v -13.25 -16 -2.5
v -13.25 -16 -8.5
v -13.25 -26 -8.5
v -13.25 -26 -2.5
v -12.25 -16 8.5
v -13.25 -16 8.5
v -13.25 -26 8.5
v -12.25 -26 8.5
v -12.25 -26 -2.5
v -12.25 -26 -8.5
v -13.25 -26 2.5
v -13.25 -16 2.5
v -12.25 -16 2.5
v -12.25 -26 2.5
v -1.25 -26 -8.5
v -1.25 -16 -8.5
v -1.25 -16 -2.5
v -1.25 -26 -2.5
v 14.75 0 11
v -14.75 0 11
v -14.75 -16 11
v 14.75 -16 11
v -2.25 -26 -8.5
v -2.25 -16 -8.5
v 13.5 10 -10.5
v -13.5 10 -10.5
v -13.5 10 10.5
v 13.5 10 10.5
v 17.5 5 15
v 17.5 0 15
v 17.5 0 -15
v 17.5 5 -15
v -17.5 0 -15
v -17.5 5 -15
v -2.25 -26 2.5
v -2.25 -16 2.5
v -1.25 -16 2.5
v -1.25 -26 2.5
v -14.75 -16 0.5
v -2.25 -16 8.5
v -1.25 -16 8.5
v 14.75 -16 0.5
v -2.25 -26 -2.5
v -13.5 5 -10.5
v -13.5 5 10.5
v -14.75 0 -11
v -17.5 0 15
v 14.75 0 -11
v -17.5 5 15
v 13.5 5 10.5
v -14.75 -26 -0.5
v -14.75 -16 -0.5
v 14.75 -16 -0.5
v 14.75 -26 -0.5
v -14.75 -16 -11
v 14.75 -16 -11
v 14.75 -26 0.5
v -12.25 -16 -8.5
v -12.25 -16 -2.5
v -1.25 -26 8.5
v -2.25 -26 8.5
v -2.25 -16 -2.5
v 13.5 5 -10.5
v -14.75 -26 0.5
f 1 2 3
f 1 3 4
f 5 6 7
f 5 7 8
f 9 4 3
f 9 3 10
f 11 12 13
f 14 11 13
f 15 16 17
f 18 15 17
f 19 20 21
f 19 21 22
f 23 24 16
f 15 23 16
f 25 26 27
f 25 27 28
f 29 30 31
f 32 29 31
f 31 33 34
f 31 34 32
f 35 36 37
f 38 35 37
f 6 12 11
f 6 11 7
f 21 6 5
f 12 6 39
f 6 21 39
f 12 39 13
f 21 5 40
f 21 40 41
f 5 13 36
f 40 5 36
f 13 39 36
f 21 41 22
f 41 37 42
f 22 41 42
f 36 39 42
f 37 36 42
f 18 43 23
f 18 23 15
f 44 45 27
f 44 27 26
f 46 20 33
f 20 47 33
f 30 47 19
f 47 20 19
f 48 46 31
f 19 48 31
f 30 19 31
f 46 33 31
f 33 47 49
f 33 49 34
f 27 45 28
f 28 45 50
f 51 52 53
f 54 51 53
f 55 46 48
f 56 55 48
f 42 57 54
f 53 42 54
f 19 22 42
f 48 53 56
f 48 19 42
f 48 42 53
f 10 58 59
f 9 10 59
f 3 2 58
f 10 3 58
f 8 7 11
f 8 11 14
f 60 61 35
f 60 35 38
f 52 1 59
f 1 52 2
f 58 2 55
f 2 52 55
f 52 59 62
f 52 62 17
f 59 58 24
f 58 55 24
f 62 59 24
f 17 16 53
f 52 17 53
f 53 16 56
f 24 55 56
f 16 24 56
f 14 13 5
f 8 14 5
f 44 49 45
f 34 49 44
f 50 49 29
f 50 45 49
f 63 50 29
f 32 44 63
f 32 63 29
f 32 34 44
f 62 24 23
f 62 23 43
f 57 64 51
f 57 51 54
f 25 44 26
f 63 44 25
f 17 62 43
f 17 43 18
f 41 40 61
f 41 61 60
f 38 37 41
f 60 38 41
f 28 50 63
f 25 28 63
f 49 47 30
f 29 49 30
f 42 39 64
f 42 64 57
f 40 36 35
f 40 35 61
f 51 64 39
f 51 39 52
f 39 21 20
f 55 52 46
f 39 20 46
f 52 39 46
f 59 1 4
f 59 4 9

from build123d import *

# Parameters (mm, degrees)
SKETCH_1_W      = 29.5
SKETCH_1_H      = 22
EXTRUDE_1_DEPTH = 16
SKETCH_2_W      = 35
SKETCH_2_H      = 30
EXTRUDE_2_DEPTH = 5
SKETCH_3_W      = 27
SKETCH_3_H      = 21
EXTRUDE_3_DEPTH = 5
SKETCH_4_W      = 29.5
SKETCH_4_H      = 1
SKETCH_4_W_2    = 1
SKETCH_4_H_2    = 6
EXTRUDE_4_DEPTH = 10


with BuildPart() as part:
    # Эскиз1 → Бобышка-Вытянуть1 (new body)
    with BuildSketch(Plane(origin=(0, 0, 0), x_dir=(1, 0, 0), z_dir=(0, 1, 0))):
        Rectangle(SKETCH_1_W, SKETCH_1_H)
    extrude(amount=-EXTRUDE_1_DEPTH)

    # Эскиз2 → Бобышка-Вытянуть2 (add)
    with BuildSketch(Plane(origin=(0, 0, 0), x_dir=(1, 0, 0), z_dir=(0, 1, 0))):
        Rectangle(SKETCH_2_W, SKETCH_2_H)
    extrude(amount=EXTRUDE_2_DEPTH)

    # Эскиз3 → Бобышка-Вытянуть3 (add)
    with BuildSketch(Plane(origin=(0, 5, 0), x_dir=(1, 0, 0), z_dir=(0, 1, 0))):
        Rectangle(SKETCH_3_W, SKETCH_3_H)
    extrude(amount=EXTRUDE_3_DEPTH)

    # Эскиз4 → Бобышка-Вытянуть4 (add)
    with BuildSketch(Plane.XZ.offset(16)):
        Rectangle(SKETCH_4_W, SKETCH_4_H)
        with Locations((-12.75, 5.5)):
            Rectangle(SKETCH_4_W_2, SKETCH_4_H_2)
        with Locations((-1.75, 5.5)):
            Rectangle(SKETCH_4_W_2, SKETCH_4_H_2)
        with Locations((-12.75, -5.5)):
            Rectangle(SKETCH_4_W_2, SKETCH_4_H_2)
        with Locations((-1.75, -5.5)):
            Rectangle(SKETCH_4_W_2, SKETCH_4_H_2)
    extrude(amount=EXTRUDE_4_DEPTH)


solid = part.part
